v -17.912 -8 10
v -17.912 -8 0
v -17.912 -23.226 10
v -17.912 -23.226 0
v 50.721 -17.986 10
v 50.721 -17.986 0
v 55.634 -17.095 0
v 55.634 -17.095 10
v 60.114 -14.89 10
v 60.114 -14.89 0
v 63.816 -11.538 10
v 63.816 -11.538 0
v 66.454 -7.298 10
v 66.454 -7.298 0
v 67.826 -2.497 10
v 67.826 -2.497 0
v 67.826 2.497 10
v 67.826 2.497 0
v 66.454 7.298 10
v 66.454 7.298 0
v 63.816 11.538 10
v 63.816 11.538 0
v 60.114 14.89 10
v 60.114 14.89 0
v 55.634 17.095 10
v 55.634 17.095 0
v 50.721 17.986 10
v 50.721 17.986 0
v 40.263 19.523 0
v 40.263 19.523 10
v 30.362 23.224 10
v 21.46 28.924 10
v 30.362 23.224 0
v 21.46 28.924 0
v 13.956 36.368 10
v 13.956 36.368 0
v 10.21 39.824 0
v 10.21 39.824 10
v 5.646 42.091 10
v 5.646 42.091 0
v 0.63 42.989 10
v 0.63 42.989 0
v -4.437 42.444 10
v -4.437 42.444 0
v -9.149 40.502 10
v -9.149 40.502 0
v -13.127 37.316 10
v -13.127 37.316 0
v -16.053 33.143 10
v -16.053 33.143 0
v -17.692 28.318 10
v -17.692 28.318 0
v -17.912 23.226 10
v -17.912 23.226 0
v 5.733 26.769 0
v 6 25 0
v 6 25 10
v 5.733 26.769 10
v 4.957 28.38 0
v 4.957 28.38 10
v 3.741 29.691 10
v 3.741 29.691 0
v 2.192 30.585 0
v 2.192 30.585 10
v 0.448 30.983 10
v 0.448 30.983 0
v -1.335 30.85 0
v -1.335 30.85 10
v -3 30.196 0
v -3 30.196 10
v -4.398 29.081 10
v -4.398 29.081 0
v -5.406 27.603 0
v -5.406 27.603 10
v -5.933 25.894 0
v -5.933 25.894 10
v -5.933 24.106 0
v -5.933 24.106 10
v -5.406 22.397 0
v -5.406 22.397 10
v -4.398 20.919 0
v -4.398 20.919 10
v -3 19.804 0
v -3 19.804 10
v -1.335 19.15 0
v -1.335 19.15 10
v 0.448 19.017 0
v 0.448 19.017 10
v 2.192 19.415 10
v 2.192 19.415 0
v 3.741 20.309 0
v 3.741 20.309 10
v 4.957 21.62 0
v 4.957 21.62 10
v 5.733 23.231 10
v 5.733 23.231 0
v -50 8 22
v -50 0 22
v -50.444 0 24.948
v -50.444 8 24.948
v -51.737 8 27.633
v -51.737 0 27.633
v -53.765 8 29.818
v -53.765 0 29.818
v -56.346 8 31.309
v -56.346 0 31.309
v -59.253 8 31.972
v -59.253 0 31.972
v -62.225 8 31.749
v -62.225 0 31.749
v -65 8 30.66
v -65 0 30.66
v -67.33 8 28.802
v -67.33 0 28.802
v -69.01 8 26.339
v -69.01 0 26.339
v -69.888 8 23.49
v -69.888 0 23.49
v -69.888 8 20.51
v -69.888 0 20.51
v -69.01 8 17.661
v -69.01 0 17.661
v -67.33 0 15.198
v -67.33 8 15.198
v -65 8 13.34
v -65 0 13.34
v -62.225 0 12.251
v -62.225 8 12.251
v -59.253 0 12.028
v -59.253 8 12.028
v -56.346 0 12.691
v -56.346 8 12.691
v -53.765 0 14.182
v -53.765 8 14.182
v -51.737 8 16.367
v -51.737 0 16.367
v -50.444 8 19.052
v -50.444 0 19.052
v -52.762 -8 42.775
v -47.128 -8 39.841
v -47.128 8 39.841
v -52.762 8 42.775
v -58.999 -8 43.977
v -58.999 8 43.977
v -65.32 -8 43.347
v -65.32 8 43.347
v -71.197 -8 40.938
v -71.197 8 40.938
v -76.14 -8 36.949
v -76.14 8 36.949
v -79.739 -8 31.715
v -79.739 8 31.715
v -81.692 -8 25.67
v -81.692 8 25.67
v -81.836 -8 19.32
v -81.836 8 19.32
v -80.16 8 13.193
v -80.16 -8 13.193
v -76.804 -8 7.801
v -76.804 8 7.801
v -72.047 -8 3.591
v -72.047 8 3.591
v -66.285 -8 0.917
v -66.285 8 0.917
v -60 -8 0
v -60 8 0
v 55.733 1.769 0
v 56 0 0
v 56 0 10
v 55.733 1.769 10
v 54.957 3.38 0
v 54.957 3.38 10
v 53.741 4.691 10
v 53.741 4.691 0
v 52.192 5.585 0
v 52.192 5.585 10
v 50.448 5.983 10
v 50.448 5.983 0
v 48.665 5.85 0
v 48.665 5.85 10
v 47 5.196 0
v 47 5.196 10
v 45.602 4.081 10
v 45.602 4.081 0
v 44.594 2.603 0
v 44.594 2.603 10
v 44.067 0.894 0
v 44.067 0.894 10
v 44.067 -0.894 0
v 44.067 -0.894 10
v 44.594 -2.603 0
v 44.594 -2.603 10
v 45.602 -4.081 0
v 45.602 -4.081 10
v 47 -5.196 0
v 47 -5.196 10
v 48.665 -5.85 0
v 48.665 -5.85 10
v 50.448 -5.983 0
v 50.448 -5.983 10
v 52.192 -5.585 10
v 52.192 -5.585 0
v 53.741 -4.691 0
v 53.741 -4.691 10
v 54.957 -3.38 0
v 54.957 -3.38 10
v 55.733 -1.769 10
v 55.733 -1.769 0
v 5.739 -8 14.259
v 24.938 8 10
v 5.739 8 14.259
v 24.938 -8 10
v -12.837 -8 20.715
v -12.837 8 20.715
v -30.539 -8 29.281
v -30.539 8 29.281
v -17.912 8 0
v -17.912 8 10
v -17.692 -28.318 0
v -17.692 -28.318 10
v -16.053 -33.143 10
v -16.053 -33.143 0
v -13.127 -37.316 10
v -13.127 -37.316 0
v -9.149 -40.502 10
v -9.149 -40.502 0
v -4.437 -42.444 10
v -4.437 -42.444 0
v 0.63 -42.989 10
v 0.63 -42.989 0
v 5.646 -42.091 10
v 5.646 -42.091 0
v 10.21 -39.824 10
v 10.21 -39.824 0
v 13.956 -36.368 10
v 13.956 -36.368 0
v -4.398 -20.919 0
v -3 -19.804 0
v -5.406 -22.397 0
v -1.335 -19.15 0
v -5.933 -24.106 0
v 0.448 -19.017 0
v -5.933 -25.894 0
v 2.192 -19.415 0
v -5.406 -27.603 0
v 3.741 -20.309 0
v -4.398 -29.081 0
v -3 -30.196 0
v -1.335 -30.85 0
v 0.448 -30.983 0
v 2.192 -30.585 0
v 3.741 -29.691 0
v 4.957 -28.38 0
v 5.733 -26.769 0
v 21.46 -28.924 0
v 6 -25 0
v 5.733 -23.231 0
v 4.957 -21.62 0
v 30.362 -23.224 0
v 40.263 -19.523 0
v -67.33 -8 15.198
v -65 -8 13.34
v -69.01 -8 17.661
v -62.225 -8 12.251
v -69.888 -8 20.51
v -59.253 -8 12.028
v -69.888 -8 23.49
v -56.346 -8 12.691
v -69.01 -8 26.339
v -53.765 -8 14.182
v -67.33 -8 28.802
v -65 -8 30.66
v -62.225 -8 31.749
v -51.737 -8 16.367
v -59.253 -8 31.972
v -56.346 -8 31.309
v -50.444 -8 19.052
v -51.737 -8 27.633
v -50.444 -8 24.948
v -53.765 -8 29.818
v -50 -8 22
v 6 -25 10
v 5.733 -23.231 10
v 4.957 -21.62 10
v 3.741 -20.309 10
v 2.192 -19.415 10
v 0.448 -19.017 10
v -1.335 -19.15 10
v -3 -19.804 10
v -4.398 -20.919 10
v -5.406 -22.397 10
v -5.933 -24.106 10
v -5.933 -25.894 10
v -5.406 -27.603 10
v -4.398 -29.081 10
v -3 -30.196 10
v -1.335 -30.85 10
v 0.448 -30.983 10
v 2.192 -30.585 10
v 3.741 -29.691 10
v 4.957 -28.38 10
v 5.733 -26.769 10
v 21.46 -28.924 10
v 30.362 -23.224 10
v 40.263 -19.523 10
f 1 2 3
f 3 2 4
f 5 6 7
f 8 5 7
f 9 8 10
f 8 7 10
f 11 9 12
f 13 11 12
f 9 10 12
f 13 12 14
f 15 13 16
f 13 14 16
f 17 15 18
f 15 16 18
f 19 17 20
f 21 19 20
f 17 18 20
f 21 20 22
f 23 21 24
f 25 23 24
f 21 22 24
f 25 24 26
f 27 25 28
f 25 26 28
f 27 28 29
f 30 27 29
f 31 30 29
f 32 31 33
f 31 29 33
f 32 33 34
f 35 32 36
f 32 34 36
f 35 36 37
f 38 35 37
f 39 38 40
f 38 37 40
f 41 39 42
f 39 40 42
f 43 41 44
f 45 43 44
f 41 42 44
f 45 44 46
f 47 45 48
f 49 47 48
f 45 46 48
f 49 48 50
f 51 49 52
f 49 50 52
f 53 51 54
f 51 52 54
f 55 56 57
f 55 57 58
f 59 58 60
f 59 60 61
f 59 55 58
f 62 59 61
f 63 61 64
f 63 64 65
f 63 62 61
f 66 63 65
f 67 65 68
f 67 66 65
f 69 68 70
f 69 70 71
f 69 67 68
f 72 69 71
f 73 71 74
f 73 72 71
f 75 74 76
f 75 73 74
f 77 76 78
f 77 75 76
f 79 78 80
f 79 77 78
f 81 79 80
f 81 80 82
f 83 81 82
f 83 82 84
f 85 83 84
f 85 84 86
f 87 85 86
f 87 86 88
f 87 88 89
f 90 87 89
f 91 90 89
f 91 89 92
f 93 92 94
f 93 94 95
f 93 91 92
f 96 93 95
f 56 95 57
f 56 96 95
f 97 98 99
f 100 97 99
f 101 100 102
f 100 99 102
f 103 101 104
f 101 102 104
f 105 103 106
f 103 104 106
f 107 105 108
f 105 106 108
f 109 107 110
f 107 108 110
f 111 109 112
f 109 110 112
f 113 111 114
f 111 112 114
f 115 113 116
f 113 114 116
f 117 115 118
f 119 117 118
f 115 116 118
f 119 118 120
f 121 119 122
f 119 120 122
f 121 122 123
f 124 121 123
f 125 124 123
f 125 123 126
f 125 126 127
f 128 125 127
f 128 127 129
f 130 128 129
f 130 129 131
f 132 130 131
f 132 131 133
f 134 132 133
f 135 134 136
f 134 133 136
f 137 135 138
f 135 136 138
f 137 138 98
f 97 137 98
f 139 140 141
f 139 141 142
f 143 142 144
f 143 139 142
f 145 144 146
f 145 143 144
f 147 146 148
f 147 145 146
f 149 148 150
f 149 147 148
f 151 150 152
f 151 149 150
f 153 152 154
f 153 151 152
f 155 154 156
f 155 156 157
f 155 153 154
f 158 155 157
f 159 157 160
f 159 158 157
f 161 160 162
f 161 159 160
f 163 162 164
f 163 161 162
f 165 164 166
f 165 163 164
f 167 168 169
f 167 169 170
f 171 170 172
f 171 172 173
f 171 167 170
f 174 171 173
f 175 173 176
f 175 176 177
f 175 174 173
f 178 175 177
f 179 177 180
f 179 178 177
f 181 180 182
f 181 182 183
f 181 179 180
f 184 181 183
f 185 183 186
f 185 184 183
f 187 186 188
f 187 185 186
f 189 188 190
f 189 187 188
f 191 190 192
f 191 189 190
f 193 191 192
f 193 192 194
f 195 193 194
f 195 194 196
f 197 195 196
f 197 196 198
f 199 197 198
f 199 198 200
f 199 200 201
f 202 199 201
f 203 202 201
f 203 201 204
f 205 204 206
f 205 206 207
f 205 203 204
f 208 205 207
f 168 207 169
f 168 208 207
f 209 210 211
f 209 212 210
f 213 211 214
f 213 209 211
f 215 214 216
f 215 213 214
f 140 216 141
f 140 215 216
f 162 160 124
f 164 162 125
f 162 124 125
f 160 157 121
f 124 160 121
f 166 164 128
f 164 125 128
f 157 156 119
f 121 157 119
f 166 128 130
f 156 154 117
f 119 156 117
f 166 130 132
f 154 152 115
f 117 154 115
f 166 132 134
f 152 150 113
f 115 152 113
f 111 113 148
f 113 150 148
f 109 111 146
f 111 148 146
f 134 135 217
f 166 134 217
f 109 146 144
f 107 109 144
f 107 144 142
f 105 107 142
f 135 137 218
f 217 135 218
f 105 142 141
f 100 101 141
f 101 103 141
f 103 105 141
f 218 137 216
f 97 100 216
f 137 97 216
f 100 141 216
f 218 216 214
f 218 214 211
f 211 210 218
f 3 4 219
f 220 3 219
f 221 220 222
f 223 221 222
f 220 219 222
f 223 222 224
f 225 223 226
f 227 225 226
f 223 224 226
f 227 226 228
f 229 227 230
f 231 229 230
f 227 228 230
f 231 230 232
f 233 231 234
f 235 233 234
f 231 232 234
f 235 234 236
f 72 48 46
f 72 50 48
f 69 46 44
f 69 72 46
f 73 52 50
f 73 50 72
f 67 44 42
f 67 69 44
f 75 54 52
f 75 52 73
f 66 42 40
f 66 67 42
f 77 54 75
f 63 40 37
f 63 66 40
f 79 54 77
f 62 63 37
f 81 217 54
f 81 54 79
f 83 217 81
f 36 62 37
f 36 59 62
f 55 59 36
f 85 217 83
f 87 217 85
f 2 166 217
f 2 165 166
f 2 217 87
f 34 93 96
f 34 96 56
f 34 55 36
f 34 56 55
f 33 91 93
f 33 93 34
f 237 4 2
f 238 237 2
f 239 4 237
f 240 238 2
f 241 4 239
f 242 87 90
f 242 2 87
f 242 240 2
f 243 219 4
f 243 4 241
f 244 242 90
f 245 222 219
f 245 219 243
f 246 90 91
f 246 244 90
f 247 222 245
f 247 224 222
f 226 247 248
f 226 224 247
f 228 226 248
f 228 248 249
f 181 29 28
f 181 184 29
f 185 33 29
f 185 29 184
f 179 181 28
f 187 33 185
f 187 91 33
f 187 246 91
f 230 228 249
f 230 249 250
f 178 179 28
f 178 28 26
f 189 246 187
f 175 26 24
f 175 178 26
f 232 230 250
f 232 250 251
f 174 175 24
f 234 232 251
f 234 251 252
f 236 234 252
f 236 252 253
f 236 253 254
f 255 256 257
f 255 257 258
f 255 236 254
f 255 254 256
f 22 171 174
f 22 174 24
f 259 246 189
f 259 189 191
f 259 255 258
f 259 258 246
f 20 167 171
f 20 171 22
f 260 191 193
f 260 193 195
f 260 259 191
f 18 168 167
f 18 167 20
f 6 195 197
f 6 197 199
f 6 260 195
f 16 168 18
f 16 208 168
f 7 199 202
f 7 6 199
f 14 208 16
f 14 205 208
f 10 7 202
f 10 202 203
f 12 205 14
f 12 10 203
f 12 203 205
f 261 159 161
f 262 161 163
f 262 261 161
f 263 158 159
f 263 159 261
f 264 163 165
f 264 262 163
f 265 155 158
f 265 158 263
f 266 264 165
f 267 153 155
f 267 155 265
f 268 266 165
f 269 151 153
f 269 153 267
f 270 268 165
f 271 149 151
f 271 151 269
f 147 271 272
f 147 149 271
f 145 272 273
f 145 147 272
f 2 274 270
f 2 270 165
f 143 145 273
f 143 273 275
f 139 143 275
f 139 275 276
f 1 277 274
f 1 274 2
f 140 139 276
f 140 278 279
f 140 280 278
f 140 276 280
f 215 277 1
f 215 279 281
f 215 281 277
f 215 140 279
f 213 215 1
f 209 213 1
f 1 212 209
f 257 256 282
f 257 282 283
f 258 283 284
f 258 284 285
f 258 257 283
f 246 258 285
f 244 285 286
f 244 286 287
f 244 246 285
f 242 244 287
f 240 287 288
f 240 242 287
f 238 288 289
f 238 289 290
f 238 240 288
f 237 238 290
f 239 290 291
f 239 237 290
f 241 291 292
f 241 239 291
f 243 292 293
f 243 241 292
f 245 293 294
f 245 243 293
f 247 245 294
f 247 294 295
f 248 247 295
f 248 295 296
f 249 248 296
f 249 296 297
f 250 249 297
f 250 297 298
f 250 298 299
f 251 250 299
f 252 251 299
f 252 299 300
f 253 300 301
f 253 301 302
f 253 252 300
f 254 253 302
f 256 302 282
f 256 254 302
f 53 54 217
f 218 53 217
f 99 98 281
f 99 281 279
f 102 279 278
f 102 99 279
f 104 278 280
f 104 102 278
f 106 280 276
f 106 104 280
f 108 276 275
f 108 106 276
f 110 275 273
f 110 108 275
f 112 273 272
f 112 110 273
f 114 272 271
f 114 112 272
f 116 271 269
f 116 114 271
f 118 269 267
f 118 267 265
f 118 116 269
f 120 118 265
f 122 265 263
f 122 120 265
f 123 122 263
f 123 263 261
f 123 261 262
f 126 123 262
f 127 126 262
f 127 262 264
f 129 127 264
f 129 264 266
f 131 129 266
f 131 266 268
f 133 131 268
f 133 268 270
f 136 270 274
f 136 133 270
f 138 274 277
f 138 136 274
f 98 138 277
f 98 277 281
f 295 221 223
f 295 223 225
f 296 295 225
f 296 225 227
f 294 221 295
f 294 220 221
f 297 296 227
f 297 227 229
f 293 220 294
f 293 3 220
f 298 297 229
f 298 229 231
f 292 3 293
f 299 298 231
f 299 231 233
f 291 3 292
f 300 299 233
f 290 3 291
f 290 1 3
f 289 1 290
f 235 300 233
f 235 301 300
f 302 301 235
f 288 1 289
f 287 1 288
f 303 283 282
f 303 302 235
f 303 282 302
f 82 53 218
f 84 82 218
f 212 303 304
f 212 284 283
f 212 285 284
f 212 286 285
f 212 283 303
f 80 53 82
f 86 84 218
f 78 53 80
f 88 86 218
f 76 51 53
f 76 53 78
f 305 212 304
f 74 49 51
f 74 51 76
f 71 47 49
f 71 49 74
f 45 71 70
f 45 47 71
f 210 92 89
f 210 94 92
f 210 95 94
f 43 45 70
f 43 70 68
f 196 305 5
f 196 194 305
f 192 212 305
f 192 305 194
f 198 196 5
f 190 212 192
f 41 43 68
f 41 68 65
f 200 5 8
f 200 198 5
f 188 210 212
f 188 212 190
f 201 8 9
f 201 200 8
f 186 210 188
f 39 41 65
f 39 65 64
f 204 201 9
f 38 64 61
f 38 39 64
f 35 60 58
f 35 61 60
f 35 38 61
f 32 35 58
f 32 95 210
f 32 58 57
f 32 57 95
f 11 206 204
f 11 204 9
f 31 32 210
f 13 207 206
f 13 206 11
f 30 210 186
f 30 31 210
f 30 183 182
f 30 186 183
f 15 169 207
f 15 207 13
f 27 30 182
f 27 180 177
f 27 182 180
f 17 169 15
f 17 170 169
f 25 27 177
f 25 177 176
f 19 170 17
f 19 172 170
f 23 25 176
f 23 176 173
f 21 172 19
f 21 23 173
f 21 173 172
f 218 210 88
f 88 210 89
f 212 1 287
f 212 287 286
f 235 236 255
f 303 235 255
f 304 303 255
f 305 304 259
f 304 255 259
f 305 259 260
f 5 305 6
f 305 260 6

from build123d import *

# Parameters (mm, degrees)
F0_R          = 6
F1_DEPTH      = 10
F2_R          = 10
F3_DEPTH      = 8
F3_DEPTH_BACK = 8


with BuildPart() as f1:
    # F0 (on Top) → F1 (new body)
    with BuildSketch(Plane.XY):
        with BuildLine():
            ThreePointArc((50.720724, 17.985565), (30.362055, 23.224109), (13.956018, 36.367918))
            ThreePointArc((13.956018, 36.367918), (-6.862265, 41.640593), (-17.912368, 23.226))
            Line((-17.912368, 23.226), (-17.912368, -23.226))
            ThreePointArc((-17.912368, -23.226), (-6.862265, -41.640593), (13.956018, -36.367918))
            ThreePointArc((13.956018, -36.367918), (30.362055, -23.224109), (50.720724, -17.985565))
            ThreePointArc((50.720724, -17.985565), (68, 0), (50.720724, 17.985565))
        make_face()
        with Locations((0, -25)):
            Circle(F0_R, mode=Mode.SUBTRACT)
        with Locations((0, 25)):
            Circle(F0_R, mode=Mode.SUBTRACT)
        with Locations((50, 0)):
            Circle(F0_R, mode=Mode.SUBTRACT)
    extrude(amount=F1_DEPTH)

    # F2 (on Front) → F3 (join, two sides)
    with BuildSketch(Plane.XZ) as f3_sk:
        with BuildLine():
            ThreePointArc((24.938122, 10), (-12.836551, 20.714776), (-47.128021, 39.841393))
            ThreePointArc((-47.128021, 39.841393), (-80.934426, 28.763481), (-59.999878, 0))
            Line((-59.999878, 0), (24.938122, 0))
            Line((24.938122, 0), (24.938122, 10))
        make_face()
        with Locations((-59.999878, 22)):
            Circle(F2_R, mode=Mode.SUBTRACT)
    extrude(amount=F3_DEPTH)
    extrude(f3_sk.sketch, amount=-F3_DEPTH_BACK)


solid = f1.part
